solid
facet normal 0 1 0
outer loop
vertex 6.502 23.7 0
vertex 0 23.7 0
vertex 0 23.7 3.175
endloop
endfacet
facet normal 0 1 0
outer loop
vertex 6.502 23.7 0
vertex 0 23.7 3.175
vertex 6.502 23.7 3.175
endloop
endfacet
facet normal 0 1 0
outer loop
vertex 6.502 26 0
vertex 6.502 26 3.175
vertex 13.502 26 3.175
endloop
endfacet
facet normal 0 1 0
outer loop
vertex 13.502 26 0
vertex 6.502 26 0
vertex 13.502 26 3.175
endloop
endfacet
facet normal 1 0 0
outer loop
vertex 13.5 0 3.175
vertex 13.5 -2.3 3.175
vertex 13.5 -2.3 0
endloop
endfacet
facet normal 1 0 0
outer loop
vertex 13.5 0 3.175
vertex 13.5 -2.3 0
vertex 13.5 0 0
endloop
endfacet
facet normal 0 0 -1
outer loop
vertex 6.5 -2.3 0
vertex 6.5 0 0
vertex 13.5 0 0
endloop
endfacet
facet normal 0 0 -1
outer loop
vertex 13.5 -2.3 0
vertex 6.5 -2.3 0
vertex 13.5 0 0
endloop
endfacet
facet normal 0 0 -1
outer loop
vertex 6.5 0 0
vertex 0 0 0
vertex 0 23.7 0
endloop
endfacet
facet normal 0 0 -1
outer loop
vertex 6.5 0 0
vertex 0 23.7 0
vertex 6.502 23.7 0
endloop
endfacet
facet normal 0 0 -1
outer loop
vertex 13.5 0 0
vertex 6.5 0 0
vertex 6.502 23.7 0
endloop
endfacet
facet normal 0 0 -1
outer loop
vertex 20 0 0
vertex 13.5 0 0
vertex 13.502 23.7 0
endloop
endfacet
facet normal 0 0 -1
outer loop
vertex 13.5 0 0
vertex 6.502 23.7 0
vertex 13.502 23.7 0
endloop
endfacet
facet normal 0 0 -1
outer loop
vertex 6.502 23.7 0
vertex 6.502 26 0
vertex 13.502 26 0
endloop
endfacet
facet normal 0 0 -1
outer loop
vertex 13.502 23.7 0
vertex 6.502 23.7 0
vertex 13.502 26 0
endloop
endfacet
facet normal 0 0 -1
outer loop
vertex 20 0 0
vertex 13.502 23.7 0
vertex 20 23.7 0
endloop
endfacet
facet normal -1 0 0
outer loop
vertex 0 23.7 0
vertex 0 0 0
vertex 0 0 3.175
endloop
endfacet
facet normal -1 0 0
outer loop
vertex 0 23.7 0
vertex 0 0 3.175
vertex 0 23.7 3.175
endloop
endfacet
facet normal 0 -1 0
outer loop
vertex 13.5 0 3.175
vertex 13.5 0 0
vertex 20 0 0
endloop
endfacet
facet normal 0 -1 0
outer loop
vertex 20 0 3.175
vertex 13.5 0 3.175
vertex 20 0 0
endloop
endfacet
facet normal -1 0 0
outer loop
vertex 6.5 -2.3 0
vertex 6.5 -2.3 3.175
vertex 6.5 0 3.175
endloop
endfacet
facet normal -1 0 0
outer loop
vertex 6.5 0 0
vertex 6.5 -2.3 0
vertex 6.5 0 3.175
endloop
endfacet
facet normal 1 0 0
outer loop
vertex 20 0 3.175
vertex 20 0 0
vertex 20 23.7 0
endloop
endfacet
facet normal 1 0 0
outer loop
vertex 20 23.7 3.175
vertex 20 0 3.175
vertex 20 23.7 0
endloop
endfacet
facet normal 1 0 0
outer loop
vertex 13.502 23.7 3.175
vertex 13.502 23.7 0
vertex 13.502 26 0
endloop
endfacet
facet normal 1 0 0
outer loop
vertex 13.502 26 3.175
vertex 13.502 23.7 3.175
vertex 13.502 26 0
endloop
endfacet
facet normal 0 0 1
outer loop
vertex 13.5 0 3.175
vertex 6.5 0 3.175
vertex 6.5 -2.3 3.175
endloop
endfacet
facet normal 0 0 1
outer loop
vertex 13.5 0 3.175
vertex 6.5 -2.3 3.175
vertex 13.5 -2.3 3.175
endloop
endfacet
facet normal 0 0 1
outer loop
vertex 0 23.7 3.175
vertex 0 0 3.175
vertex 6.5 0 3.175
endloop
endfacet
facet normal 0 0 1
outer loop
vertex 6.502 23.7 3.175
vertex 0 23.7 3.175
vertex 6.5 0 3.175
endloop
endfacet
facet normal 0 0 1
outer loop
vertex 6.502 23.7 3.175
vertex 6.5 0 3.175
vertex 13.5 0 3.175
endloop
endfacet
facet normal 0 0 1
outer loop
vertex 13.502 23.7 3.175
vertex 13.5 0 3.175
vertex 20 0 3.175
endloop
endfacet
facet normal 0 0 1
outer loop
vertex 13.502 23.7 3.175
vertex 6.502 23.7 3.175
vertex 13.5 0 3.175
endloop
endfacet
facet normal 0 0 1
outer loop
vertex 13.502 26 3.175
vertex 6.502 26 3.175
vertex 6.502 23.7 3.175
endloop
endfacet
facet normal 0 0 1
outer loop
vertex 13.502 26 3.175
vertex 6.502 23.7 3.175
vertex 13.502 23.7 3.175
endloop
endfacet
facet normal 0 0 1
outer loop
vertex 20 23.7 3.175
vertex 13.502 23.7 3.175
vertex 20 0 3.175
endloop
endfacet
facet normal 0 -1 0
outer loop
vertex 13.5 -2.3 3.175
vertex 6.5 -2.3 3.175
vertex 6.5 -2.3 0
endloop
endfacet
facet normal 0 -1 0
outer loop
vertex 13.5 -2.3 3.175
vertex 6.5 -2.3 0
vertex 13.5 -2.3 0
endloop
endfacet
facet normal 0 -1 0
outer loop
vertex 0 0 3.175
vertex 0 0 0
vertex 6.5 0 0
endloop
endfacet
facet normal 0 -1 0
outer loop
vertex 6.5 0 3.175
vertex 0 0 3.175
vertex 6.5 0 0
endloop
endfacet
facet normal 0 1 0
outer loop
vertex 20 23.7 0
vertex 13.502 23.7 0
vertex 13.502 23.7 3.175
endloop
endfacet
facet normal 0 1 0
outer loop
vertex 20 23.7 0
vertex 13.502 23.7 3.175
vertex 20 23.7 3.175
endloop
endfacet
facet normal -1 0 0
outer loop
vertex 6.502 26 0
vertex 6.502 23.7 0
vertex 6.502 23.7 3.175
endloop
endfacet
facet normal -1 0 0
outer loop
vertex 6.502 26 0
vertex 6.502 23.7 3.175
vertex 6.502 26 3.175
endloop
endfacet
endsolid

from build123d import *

# Parameters (mm, degrees)
SKETCH1_W           = 20
SKETCH1_H           = 23.7
BOSS_EXTRUDE1_DEPTH = 3.175
SKETCH2_W           = 7
SKETCH2_H           = 2.3
BOSS_EXTRUDE2_DEPTH = 3.175


with BuildPart() as part:
    # Sketch1 → Boss-Extrude1 (new body)
    with BuildSketch(Plane.XY):
        with Locations((10, 11.85)):
            Rectangle(SKETCH1_W, SKETCH1_H)
    extrude(amount=BOSS_EXTRUDE1_DEPTH)

    # Sketch2 → Boss-Extrude2 (add)
    with BuildSketch(Plane.XY.offset(3.175)):
        with Locations((10.002051165, 24.85)):
            Rectangle(SKETCH2_W, SKETCH2_H)
        with Locations((10, -1.15)):
            Rectangle(SKETCH2_W, SKETCH2_H)
    extrude(amount=-BOSS_EXTRUDE2_DEPTH)


solid = part.part
